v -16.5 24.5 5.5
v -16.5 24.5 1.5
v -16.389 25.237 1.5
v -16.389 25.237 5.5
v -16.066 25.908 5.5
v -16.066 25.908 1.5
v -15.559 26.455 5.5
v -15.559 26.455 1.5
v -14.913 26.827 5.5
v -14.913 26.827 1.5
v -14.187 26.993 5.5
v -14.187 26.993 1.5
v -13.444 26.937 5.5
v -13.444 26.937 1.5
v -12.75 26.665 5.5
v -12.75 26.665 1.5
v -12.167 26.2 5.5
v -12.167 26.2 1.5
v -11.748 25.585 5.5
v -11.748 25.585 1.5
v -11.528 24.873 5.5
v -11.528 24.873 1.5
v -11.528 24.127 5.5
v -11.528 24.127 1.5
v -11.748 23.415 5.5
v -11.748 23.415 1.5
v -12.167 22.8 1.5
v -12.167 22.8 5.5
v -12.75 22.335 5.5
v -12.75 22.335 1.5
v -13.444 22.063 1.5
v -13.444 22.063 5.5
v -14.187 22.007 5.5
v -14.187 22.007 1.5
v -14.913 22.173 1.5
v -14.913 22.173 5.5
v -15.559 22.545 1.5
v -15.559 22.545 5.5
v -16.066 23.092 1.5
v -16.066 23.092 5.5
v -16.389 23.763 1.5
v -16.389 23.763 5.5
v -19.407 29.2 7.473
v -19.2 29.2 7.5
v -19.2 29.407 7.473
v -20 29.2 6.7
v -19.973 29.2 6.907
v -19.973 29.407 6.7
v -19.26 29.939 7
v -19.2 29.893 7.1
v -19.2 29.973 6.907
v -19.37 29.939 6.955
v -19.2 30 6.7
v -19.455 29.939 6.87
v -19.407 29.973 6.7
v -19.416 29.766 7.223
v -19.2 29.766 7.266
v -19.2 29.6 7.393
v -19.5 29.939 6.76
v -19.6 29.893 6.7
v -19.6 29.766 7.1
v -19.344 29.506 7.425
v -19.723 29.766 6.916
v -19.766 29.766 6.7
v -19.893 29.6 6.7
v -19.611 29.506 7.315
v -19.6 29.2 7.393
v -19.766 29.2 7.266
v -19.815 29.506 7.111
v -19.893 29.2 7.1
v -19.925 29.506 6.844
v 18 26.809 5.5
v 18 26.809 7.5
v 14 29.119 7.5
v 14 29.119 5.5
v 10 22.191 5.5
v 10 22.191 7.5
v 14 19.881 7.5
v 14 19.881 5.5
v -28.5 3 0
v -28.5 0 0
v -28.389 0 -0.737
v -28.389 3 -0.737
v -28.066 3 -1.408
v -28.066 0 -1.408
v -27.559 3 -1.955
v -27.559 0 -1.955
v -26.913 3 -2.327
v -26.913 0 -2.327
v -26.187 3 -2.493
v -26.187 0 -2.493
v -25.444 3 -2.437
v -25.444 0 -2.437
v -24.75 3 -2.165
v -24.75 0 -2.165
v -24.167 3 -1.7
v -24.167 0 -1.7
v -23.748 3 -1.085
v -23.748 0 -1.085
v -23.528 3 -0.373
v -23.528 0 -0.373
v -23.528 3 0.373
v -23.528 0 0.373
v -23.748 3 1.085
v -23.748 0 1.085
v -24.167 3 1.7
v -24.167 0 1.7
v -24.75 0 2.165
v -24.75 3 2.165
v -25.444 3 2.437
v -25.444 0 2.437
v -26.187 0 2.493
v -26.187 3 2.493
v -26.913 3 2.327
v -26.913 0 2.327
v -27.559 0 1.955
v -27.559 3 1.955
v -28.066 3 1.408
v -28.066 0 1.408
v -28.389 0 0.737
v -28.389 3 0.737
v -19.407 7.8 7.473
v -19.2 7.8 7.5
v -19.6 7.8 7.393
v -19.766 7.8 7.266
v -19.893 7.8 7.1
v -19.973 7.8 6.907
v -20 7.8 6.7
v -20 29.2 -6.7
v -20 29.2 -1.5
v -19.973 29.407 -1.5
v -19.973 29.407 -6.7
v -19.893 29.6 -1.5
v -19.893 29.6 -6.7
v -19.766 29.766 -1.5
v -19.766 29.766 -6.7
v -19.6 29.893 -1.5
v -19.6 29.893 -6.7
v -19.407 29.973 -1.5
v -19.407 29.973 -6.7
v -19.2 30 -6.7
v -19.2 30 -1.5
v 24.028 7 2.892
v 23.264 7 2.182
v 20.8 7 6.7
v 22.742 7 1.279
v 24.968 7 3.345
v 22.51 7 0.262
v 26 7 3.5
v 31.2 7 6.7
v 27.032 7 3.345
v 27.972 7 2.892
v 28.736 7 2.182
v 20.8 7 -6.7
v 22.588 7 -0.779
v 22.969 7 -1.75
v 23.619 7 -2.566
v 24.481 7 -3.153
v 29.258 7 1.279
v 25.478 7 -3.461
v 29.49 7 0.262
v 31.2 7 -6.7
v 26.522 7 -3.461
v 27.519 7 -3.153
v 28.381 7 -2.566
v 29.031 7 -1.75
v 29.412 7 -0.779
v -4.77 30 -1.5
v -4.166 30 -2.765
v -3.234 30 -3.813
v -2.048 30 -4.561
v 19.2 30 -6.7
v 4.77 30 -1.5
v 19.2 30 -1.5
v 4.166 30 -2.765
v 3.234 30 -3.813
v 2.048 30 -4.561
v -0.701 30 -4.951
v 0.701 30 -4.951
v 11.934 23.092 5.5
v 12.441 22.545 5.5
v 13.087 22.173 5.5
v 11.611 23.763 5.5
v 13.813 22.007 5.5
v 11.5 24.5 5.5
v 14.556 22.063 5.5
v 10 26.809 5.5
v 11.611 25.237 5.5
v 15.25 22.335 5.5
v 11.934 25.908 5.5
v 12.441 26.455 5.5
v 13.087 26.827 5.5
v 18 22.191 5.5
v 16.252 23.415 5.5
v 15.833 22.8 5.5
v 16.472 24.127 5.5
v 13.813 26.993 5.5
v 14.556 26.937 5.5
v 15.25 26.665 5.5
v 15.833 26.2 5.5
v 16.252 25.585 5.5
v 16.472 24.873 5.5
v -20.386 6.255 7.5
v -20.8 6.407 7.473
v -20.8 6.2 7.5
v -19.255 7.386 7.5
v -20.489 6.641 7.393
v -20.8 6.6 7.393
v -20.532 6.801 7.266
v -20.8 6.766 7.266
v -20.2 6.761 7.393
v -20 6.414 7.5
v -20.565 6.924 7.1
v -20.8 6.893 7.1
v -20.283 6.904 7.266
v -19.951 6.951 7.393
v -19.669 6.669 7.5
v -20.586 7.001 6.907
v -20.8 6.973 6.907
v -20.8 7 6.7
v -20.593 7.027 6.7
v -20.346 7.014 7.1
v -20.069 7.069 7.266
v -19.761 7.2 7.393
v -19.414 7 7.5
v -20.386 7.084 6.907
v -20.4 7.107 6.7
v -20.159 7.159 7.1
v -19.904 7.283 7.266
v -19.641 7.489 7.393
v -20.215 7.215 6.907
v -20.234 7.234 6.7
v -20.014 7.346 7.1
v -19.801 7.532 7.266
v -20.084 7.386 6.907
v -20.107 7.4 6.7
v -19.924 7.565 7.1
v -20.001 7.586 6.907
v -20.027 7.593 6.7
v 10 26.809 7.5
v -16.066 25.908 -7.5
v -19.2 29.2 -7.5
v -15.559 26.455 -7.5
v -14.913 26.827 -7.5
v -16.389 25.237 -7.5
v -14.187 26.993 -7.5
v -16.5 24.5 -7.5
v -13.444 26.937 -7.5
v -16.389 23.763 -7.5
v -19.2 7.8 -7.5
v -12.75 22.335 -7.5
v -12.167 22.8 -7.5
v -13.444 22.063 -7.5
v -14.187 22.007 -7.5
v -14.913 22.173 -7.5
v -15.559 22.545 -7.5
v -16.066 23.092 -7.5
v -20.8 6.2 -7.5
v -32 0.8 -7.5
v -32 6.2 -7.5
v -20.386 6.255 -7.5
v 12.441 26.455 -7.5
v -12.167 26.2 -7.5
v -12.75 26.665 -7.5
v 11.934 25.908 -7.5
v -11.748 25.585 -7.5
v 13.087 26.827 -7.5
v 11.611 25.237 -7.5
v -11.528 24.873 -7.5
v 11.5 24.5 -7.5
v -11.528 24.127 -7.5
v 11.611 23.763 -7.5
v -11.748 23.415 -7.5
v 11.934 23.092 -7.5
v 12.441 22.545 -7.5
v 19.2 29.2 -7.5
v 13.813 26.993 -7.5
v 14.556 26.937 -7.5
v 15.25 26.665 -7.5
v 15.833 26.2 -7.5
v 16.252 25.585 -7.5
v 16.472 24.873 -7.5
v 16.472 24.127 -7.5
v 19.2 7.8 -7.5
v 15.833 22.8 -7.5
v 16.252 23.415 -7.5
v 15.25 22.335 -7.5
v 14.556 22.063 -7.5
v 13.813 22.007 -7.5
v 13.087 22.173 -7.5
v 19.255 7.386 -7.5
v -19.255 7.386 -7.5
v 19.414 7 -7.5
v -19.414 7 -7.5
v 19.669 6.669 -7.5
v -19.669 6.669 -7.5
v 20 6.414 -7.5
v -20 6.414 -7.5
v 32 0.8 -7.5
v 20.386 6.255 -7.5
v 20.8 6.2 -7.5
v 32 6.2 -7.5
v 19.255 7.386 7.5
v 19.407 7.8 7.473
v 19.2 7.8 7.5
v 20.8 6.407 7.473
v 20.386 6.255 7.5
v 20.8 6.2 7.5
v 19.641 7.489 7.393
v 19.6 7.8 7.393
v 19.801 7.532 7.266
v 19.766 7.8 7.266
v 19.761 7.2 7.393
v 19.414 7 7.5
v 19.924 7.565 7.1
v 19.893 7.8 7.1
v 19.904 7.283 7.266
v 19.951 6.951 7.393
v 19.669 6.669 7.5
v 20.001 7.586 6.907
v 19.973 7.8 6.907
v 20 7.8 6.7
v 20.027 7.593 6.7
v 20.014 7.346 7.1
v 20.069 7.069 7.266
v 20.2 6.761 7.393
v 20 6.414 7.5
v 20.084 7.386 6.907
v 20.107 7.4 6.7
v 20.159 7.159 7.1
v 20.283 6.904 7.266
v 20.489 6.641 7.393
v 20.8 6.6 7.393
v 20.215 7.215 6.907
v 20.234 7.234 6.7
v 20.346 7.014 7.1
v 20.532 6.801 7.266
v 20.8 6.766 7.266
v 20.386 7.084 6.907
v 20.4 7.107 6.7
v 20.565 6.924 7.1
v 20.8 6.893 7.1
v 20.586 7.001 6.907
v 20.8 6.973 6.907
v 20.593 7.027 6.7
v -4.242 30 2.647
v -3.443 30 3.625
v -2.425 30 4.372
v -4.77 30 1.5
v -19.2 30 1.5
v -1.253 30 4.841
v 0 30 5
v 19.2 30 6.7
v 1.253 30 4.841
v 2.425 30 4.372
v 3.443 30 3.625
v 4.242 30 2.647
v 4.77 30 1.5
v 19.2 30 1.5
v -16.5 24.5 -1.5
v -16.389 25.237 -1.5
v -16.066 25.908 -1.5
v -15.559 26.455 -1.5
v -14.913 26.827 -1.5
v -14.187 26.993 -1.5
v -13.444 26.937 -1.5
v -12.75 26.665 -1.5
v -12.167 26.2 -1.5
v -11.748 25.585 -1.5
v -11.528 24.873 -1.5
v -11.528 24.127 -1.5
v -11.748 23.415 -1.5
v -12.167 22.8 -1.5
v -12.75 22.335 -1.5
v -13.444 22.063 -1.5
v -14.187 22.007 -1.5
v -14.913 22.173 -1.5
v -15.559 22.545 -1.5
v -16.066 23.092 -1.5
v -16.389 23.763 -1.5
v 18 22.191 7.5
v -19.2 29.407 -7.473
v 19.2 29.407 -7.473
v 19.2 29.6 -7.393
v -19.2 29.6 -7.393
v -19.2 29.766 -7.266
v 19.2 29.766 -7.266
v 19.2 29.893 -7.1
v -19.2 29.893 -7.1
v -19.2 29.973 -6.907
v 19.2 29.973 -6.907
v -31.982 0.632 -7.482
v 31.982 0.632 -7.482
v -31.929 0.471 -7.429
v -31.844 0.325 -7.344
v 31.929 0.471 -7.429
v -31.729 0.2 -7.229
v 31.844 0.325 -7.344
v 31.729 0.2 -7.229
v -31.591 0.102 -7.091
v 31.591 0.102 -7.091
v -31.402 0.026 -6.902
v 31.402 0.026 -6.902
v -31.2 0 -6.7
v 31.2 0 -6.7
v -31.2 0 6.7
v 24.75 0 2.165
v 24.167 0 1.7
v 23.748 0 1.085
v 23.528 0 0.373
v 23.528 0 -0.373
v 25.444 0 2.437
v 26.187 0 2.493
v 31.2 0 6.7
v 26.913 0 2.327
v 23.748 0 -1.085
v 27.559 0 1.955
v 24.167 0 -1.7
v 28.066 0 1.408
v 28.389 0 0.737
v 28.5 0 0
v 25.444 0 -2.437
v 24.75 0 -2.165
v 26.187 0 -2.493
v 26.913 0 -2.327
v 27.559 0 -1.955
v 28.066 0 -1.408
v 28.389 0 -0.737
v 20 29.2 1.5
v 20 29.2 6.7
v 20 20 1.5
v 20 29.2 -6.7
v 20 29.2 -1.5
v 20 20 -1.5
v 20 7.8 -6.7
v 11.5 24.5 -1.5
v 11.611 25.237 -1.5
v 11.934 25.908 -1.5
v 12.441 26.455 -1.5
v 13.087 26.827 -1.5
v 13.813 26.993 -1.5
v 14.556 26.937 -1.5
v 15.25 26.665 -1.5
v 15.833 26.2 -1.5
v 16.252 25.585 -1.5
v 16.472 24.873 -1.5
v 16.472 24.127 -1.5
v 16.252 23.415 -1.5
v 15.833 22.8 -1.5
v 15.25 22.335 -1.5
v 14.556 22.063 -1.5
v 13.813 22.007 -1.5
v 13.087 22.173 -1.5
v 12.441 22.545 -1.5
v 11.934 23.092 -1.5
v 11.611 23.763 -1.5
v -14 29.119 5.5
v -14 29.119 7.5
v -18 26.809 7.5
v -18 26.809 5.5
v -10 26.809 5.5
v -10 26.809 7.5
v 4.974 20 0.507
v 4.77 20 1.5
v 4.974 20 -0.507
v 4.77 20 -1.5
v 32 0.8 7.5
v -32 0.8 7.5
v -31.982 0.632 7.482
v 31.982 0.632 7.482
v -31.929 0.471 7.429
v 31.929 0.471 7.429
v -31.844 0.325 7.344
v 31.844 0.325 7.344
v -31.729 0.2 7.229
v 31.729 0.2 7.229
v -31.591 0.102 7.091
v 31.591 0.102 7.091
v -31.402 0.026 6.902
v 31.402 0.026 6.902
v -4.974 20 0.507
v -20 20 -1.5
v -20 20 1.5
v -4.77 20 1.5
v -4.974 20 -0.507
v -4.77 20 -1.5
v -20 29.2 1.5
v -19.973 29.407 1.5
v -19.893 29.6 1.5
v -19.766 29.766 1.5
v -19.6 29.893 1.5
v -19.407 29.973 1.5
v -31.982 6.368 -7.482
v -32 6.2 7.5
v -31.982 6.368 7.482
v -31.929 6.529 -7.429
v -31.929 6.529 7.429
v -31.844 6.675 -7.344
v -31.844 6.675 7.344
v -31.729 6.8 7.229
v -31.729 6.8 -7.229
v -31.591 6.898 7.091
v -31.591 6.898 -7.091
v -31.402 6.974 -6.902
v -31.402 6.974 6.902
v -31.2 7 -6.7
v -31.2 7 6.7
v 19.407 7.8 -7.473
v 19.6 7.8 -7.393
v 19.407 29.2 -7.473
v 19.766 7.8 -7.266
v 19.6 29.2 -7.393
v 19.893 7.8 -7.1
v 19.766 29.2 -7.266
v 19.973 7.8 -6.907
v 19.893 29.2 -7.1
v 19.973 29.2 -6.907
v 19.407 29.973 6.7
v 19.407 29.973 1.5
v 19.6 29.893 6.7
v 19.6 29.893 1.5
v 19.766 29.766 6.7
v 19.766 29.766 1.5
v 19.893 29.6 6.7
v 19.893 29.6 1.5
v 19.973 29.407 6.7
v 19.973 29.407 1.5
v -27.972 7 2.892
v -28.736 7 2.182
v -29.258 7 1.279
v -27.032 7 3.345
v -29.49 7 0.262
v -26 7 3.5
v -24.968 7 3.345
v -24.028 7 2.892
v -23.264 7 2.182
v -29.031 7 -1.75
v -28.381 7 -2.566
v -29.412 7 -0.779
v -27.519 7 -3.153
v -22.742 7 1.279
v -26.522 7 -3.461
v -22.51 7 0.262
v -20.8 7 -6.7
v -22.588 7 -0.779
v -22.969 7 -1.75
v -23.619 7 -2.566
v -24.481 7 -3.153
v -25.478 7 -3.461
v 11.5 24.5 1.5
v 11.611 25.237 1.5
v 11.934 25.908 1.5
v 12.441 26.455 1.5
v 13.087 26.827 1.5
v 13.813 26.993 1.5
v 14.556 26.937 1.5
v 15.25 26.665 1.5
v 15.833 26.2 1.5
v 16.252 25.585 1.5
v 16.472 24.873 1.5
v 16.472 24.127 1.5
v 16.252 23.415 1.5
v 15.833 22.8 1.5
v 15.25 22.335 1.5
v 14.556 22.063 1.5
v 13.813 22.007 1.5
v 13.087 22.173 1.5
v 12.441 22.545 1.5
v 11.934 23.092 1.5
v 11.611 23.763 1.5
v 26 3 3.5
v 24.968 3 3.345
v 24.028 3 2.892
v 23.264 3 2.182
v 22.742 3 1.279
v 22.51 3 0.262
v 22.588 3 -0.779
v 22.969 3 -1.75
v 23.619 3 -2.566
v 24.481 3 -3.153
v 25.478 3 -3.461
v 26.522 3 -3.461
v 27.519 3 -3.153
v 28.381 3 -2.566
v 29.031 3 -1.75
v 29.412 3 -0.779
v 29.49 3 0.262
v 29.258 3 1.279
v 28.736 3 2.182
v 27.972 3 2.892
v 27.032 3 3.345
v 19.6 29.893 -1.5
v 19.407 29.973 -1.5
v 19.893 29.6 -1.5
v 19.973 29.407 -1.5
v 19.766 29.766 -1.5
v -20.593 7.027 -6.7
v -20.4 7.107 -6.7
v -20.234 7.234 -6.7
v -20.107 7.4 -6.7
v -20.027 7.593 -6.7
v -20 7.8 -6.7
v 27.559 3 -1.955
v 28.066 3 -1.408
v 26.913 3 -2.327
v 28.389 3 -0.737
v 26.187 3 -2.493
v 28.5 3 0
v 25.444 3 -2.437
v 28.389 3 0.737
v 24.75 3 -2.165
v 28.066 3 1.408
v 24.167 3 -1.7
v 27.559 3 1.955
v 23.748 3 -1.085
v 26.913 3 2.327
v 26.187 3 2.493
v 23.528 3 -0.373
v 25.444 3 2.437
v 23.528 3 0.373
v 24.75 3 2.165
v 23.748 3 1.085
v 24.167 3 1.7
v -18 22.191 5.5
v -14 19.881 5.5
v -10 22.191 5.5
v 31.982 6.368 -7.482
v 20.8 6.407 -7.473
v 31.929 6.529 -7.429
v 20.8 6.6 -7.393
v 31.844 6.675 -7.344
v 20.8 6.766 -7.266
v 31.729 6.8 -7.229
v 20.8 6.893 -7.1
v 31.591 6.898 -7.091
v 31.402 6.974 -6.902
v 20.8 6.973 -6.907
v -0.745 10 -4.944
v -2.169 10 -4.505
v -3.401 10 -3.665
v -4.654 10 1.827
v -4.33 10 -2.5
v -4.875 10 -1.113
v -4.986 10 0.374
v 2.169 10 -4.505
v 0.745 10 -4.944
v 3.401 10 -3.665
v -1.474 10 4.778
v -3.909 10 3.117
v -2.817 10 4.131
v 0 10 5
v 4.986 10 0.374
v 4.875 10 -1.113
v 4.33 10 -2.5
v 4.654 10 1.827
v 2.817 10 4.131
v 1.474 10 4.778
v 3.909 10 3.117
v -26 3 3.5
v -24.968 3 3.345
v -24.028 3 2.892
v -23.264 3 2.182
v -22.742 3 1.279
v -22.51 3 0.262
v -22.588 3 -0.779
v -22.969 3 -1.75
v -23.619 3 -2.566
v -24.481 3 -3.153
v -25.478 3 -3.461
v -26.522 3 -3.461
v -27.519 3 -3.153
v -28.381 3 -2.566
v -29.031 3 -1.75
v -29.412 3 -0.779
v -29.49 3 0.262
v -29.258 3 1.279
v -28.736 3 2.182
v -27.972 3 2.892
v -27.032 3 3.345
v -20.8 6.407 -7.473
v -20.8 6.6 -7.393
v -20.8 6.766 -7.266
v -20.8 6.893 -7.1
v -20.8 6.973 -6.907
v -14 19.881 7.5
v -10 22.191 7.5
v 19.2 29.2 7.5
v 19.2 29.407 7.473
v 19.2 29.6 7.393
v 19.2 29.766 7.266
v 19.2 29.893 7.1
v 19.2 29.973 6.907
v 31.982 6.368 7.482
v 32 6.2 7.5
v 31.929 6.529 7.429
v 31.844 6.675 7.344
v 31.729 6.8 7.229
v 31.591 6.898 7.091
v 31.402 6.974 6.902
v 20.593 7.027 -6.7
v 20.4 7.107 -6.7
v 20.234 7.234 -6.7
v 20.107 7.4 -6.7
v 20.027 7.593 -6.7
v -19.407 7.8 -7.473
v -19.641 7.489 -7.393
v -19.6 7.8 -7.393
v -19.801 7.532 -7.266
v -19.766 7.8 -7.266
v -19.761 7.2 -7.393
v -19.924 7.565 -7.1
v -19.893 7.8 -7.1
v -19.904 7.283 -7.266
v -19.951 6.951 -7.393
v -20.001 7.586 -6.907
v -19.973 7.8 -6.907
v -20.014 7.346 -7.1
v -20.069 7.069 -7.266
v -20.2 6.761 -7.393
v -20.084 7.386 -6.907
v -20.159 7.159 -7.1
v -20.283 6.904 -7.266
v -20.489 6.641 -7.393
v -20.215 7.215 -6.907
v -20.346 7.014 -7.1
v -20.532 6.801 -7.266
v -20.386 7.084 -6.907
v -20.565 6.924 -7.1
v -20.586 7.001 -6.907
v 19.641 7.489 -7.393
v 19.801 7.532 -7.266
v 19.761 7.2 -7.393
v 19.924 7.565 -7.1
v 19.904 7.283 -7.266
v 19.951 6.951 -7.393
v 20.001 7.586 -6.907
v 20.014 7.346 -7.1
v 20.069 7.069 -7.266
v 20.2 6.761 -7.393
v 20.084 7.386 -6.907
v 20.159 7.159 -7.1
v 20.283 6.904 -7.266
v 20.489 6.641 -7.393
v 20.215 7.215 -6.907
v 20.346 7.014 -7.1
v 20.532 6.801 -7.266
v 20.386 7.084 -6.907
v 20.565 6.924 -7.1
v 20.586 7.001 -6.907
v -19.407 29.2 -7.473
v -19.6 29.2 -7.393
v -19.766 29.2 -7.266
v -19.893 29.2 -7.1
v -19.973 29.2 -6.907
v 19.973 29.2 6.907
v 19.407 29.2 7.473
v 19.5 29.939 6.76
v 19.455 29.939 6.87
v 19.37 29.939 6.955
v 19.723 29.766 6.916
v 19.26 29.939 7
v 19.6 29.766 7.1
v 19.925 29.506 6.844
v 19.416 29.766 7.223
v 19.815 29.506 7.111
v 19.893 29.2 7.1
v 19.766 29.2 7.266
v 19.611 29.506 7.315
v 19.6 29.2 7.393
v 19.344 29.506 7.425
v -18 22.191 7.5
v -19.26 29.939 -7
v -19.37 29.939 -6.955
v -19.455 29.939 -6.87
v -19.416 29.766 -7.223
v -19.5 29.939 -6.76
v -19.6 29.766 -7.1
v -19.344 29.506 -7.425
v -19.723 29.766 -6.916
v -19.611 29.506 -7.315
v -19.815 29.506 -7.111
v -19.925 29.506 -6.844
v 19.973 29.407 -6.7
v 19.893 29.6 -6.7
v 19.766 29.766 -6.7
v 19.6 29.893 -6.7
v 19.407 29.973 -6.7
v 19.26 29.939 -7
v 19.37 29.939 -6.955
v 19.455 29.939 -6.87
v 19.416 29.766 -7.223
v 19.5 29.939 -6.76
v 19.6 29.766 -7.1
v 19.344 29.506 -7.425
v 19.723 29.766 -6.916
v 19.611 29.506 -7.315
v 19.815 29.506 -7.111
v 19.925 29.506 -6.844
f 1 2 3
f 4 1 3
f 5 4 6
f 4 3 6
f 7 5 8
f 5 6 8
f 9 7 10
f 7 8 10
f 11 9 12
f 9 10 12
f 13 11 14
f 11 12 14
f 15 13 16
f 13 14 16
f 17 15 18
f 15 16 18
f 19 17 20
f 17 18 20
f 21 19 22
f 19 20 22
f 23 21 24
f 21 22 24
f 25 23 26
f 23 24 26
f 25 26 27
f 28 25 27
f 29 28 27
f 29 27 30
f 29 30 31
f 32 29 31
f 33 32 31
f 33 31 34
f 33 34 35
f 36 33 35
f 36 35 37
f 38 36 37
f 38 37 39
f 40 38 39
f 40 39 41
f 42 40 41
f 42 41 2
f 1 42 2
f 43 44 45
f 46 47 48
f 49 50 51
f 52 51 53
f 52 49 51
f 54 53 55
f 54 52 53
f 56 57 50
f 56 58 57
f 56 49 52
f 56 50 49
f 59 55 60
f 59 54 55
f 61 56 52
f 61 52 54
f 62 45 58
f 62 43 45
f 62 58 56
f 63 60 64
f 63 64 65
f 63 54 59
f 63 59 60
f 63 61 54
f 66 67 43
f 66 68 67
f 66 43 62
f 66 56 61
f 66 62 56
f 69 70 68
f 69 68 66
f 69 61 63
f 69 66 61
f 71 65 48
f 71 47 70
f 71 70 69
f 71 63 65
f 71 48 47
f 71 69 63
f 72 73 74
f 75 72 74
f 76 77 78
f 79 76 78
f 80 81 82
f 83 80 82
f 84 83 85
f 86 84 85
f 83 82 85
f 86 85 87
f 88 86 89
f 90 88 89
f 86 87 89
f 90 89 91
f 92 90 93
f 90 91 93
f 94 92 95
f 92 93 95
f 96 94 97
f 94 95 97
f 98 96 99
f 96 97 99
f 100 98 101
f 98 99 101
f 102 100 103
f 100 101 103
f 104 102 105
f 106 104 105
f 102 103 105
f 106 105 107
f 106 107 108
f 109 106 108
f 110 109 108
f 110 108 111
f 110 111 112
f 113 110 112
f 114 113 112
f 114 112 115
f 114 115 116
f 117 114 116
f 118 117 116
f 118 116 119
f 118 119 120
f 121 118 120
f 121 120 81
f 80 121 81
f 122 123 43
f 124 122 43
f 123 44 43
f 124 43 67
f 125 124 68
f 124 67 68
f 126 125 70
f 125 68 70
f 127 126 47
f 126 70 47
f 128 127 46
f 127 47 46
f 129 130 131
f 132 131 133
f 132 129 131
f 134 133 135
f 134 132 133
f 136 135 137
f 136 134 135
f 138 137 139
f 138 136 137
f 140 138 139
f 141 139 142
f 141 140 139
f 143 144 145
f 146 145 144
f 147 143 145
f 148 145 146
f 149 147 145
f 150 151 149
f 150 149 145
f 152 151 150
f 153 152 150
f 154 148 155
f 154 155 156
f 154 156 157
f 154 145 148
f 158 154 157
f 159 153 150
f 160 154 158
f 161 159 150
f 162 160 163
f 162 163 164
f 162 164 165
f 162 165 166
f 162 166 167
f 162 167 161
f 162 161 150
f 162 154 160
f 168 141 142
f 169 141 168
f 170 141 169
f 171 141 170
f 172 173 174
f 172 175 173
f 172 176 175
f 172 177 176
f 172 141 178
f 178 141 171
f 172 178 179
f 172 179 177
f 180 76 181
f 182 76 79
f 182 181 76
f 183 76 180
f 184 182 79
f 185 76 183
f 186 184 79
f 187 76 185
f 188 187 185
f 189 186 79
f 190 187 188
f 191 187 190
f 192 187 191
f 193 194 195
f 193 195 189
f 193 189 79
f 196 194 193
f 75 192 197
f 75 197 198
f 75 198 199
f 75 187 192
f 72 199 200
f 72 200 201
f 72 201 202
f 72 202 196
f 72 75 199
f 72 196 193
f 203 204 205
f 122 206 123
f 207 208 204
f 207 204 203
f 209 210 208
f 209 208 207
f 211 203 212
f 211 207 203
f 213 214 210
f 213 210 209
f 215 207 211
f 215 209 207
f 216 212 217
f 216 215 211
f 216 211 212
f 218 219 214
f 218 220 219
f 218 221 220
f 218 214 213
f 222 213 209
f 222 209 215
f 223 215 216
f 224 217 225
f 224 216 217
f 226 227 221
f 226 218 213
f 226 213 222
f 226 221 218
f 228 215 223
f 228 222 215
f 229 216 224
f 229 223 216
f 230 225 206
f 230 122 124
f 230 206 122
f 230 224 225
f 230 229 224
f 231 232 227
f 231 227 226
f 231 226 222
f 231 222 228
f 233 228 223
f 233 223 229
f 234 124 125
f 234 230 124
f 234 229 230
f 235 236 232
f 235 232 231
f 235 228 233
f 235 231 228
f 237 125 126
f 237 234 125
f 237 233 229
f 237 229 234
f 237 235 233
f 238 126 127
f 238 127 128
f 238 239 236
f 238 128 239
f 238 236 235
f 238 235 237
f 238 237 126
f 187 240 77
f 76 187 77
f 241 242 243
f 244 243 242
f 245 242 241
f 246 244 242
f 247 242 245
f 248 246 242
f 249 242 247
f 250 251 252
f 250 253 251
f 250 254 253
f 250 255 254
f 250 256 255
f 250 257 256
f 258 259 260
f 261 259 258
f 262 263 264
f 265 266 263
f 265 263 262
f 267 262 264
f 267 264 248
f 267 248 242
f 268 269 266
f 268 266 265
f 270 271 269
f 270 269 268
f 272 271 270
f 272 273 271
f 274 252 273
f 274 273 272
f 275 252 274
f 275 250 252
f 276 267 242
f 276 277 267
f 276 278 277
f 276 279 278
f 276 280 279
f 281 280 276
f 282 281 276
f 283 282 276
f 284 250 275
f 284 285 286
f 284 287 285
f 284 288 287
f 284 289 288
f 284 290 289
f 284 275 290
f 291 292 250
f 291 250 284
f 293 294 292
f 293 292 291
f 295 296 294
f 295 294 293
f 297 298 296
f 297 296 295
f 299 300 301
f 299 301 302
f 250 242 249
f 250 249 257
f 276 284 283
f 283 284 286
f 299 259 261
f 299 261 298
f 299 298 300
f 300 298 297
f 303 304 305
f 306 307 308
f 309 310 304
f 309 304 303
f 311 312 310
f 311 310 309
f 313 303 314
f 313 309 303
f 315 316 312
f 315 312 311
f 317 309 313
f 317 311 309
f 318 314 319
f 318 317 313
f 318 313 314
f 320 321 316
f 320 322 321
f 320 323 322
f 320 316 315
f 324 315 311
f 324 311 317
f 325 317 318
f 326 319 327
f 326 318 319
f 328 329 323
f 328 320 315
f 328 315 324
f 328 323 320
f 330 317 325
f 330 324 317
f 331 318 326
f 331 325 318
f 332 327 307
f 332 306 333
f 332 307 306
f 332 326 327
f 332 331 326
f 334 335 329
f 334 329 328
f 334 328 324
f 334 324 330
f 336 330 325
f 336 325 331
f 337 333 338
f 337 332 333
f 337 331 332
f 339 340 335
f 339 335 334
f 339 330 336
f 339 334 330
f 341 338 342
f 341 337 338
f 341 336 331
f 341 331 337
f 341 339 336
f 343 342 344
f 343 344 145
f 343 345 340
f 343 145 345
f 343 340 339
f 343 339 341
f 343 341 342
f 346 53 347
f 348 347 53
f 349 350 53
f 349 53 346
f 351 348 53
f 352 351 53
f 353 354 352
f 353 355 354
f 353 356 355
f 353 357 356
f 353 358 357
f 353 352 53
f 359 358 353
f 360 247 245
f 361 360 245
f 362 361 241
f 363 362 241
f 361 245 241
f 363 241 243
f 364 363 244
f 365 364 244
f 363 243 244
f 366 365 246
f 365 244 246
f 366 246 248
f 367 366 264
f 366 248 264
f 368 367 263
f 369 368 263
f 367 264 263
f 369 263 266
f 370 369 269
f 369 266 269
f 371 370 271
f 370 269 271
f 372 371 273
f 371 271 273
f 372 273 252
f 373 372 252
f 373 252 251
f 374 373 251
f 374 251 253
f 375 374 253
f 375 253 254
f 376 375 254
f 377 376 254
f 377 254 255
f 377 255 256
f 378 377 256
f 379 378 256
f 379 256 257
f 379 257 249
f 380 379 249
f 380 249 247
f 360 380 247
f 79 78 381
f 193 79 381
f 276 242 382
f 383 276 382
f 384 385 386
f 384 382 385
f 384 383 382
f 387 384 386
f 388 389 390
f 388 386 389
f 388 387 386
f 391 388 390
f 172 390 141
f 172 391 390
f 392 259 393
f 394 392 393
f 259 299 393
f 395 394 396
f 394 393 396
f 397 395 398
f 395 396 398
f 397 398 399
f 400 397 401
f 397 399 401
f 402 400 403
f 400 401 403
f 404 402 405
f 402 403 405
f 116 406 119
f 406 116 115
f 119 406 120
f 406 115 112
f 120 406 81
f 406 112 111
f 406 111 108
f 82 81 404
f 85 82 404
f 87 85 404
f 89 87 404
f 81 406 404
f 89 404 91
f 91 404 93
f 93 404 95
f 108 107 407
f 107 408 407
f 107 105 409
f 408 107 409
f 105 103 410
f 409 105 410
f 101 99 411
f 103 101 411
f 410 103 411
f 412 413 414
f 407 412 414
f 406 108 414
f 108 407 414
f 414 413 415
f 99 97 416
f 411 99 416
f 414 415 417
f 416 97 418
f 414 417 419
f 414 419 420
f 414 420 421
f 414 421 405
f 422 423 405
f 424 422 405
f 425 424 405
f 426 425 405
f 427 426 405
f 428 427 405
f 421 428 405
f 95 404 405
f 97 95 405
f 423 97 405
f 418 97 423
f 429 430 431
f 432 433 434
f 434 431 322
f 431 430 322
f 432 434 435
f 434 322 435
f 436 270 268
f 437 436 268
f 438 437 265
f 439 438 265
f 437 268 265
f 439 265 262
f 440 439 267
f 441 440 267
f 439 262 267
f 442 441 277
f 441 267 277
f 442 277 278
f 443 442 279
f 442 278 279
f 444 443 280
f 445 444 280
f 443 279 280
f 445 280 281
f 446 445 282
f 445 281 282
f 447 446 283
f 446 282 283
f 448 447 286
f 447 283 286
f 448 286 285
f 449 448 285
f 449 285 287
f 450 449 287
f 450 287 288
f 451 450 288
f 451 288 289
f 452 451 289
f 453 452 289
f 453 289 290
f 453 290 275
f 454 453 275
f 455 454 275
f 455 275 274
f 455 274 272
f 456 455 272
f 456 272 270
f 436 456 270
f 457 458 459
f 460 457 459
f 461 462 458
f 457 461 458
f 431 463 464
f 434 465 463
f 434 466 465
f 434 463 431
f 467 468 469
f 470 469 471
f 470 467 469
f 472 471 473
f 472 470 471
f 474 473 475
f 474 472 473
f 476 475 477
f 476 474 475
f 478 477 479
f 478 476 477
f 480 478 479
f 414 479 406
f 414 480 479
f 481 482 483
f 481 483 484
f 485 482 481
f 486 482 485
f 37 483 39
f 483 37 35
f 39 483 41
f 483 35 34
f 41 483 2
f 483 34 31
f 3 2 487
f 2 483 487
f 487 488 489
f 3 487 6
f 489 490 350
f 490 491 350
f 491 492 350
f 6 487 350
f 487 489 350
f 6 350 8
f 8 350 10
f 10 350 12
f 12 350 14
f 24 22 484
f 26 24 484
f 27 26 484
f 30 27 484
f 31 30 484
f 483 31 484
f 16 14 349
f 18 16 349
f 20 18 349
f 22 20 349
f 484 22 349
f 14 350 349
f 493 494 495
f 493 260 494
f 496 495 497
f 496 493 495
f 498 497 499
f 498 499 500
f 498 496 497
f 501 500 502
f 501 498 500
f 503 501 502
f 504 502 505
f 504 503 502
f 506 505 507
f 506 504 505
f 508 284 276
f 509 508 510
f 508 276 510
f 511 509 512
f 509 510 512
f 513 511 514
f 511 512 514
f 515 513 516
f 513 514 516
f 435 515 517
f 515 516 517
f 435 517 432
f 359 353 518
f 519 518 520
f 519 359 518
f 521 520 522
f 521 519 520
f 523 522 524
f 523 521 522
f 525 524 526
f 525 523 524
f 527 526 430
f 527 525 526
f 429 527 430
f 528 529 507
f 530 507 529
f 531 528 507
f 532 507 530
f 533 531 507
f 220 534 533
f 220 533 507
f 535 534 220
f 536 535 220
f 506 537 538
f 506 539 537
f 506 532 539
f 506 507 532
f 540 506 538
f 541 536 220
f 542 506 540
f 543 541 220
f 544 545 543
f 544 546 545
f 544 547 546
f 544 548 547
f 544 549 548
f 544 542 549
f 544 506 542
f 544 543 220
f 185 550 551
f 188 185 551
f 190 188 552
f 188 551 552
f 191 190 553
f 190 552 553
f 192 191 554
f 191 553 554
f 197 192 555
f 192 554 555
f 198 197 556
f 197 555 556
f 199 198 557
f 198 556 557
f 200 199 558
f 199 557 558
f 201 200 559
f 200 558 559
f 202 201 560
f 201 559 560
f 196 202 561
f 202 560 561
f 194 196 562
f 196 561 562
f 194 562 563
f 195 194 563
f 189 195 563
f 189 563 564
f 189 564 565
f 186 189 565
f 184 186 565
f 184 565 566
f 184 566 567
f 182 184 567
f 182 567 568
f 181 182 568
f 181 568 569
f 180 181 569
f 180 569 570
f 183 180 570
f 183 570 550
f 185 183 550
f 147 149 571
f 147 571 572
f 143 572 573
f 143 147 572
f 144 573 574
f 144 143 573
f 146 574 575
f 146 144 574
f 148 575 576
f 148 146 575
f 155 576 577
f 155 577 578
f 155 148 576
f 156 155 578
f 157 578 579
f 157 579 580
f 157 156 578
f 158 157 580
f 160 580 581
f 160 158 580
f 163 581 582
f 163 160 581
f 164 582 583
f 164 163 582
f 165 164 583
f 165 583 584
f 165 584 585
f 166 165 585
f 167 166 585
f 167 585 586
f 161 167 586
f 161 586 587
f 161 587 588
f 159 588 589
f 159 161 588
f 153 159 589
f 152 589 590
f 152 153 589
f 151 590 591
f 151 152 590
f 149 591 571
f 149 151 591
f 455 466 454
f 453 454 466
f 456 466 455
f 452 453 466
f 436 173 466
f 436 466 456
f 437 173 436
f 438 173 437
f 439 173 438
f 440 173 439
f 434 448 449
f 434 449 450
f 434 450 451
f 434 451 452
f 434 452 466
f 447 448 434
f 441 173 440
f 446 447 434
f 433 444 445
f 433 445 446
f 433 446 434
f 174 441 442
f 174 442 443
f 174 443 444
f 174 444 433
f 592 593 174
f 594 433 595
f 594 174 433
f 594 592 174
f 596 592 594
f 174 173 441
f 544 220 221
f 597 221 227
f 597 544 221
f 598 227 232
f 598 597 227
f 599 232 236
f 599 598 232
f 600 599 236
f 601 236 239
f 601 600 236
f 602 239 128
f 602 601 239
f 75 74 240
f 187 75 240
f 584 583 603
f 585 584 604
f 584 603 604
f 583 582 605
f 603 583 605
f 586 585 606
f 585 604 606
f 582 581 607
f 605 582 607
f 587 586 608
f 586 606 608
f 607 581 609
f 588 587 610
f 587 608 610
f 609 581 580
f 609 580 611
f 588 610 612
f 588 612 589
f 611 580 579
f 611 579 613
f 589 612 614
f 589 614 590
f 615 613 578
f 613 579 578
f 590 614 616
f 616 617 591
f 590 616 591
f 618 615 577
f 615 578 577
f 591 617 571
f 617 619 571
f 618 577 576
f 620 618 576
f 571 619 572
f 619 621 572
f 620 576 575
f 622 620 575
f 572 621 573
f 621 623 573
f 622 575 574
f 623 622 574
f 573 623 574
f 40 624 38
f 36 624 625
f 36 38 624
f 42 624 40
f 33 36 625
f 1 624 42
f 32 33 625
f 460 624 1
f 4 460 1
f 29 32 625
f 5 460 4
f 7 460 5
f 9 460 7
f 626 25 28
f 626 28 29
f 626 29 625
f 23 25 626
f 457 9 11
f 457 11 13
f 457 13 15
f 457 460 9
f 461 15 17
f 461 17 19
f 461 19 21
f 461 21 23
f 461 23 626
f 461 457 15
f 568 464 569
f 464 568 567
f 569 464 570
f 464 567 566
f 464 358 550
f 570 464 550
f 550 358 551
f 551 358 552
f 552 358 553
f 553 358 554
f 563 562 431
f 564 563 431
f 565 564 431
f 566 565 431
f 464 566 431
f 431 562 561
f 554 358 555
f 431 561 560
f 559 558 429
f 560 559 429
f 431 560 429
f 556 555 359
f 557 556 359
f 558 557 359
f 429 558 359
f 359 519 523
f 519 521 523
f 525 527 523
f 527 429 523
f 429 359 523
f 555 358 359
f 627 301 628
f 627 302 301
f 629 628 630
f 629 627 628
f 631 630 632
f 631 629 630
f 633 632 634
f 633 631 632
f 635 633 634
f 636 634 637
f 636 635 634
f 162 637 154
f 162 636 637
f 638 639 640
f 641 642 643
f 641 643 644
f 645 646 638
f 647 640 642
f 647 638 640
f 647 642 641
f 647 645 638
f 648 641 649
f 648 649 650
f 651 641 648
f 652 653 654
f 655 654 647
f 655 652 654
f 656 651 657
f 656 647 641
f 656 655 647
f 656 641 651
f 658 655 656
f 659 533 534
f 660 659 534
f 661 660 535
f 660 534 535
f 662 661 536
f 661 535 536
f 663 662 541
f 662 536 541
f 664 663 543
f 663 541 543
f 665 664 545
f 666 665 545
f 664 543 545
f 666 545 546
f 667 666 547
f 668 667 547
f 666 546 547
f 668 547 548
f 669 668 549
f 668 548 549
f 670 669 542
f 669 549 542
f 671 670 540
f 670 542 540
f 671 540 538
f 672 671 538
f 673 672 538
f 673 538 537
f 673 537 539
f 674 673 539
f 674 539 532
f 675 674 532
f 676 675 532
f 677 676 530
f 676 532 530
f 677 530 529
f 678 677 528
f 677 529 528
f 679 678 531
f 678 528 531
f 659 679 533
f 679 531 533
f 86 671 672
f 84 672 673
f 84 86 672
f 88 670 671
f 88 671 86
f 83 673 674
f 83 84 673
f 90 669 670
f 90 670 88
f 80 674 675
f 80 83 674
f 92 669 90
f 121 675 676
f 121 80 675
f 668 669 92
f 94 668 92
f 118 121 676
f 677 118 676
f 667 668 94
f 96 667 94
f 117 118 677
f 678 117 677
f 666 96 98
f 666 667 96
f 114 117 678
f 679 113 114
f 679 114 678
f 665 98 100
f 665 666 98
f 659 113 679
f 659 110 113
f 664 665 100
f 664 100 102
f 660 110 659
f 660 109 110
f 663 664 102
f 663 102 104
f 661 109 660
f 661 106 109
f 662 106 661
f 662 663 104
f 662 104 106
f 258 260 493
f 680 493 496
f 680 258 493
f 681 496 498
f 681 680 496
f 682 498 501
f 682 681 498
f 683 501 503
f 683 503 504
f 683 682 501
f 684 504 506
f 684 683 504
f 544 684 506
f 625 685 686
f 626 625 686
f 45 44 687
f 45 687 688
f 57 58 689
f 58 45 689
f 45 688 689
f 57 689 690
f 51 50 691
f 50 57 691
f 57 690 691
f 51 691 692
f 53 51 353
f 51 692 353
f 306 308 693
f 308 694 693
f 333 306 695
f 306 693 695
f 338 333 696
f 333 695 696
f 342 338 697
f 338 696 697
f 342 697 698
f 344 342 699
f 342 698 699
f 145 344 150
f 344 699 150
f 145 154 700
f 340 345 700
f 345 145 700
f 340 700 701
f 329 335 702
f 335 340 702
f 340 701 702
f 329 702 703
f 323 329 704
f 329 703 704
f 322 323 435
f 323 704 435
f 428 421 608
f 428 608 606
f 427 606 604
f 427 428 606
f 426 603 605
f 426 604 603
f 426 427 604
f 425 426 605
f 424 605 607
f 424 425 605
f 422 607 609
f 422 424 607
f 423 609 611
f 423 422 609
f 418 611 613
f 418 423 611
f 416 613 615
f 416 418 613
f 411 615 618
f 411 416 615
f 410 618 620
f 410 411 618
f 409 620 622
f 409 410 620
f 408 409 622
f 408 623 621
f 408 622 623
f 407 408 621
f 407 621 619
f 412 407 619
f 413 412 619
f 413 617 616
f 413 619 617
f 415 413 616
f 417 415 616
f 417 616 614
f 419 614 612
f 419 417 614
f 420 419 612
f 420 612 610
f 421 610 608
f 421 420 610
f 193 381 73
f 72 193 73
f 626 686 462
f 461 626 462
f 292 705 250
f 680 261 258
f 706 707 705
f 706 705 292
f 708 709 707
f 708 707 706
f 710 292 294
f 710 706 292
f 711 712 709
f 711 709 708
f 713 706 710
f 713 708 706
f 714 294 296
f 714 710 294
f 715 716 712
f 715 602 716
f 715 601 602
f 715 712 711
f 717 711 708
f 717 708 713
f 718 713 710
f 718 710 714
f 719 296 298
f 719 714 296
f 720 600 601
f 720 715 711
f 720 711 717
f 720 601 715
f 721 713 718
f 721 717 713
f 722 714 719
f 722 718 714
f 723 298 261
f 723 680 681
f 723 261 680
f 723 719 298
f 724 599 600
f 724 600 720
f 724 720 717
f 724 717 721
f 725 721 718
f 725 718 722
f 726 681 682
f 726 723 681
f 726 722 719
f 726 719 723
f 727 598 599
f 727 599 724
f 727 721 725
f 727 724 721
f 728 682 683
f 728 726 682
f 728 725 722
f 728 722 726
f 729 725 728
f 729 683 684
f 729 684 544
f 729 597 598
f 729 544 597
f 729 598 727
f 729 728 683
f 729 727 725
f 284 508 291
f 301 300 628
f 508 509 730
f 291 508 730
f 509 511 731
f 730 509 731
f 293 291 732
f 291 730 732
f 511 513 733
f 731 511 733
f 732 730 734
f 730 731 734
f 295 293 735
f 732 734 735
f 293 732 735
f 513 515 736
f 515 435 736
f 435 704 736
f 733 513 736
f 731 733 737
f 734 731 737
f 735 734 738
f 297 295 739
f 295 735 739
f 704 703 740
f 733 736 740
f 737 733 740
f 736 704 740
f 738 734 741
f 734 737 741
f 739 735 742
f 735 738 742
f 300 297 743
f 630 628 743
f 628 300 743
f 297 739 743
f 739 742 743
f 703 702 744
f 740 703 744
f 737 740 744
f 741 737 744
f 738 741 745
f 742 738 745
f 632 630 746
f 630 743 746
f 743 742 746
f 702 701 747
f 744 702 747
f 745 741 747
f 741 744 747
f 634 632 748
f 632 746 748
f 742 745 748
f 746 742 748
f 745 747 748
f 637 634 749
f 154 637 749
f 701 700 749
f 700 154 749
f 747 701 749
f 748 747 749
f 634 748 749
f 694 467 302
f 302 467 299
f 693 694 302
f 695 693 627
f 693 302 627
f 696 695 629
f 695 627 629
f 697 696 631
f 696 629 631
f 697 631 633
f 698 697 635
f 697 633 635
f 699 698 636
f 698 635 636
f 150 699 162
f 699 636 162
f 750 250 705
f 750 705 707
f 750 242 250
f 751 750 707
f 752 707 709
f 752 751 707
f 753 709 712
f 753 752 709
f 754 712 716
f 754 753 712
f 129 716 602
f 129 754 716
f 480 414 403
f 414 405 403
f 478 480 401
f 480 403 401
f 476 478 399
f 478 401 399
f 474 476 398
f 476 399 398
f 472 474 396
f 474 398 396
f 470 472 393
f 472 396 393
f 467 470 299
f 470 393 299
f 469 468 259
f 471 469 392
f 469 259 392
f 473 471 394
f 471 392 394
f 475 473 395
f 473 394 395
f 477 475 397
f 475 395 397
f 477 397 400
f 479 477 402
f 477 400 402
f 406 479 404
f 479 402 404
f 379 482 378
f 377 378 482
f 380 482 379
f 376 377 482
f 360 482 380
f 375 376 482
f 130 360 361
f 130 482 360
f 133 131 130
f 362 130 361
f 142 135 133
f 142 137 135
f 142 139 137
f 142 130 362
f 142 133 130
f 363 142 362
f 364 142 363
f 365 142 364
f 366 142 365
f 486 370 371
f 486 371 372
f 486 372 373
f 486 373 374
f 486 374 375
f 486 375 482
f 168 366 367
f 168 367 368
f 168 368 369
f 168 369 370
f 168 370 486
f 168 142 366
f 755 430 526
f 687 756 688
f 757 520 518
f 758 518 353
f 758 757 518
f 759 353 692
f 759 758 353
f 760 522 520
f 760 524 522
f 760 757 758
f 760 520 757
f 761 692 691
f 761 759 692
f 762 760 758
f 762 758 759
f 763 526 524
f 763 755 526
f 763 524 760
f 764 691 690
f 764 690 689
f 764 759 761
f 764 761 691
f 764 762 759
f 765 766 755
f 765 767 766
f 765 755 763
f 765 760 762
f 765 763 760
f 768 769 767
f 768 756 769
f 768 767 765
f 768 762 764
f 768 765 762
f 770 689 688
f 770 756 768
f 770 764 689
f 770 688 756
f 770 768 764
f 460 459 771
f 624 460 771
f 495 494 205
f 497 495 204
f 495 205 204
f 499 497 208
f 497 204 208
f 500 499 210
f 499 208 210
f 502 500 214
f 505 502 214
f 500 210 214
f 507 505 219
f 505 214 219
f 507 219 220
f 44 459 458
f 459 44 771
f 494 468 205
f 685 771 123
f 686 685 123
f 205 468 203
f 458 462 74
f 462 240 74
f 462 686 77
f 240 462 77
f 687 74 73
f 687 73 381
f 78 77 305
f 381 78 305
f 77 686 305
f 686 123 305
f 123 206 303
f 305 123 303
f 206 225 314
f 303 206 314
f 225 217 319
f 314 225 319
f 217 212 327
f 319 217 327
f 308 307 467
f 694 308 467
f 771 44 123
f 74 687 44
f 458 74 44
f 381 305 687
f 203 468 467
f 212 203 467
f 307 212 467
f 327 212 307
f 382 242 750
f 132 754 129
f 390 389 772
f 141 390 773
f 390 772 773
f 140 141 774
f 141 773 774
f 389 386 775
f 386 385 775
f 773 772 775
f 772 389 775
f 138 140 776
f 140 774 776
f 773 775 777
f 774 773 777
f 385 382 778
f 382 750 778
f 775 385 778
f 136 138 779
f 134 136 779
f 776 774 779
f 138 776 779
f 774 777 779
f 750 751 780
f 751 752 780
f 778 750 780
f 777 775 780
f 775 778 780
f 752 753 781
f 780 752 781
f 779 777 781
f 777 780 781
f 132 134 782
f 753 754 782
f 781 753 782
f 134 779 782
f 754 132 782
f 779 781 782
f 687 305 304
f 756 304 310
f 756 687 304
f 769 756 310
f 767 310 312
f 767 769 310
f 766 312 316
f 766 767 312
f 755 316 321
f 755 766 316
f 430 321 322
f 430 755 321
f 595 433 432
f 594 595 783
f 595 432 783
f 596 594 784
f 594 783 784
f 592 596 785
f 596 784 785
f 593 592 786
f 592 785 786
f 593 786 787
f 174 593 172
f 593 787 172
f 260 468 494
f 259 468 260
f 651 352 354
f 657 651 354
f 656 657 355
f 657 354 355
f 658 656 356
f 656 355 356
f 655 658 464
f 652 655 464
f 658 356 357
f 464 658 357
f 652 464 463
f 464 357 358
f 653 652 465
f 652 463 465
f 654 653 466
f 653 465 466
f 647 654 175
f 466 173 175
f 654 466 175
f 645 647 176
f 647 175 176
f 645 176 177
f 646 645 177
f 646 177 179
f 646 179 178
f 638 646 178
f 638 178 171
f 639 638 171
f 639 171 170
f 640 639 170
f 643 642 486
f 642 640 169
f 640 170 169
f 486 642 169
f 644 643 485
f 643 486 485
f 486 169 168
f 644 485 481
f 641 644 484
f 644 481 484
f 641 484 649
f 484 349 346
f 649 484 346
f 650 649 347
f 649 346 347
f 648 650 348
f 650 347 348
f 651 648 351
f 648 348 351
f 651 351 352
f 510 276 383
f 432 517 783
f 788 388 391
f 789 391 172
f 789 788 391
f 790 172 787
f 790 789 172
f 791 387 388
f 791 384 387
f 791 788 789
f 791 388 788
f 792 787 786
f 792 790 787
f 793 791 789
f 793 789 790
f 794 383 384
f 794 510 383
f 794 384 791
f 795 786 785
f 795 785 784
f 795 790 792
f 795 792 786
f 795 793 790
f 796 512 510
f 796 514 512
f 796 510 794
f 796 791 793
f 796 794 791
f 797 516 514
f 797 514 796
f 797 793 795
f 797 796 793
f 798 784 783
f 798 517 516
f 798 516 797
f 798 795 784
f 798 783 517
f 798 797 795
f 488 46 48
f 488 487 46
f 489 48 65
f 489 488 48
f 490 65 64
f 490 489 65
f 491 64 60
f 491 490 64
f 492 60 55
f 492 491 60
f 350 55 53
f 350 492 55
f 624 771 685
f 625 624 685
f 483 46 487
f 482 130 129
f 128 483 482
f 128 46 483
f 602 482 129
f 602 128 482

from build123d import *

# Parameters (mm, degrees)
SKETCH_1_W          = 64
SKETCH_1_H          = 15
EXTRUDE_1_DEPTH     = 7
SKETCH_2_W          = 40
SKETCH_2_H          = 15
EXTRUDE_2_DEPTH     = 23
SKETCH_3_R          = 5
CUT_EXTRUDE_1_DEPTH = 20
SKETCH_4_W          = 40
SKETCH_4_H          = 3
CUT_EXTRUDE_2_DEPTH = 10
HOLE_WIZARD_M5_1_D  = 5
SKETCH_8_R          = 3.5
CUT_EXTRUDE_3_DEPTH = 4
HOLE_WIZARD_M5_2_D  = 5
CUT_EXTRUDE_5_DEPTH = 2
FILLET_1_R          = 0.8


with BuildPart() as part:
    # 草图1 → 凸台-拉伸1 (new body)
    with BuildSketch(Plane(origin=(0, 0, 0), x_dir=(1, 0, 0), z_dir=(0, 1, 0))):
        Rectangle(SKETCH_1_W, SKETCH_1_H)
    extrude(amount=EXTRUDE_1_DEPTH)

    # 草图2 → 凸台-拉伸2 (add)
    with BuildSketch(Plane(origin=(0, 7, 0), x_dir=(1, 0, 0), z_dir=(0, 1, 0))):
        Rectangle(SKETCH_2_W, SKETCH_2_H)
    extrude(amount=EXTRUDE_2_DEPTH)

    # 草图3 → 切除-拉伸1 (cut)
    with BuildSketch(Plane(origin=(0, 30, 0), x_dir=(1, 0, 0), z_dir=(0, 1, 0))):
        with Locations(Location((0, 0, 0), (0, 0, 270))):
            Circle(SKETCH_3_R)
    extrude(amount=-CUT_EXTRUDE_1_DEPTH, mode=Mode.SUBTRACT)

    # 草图4 → 切除-拉伸2 (cut)
    with BuildSketch(Plane(origin=(0, 30, 0), x_dir=(1, 0, 0), z_dir=(0, 1, 0))):
        Rectangle(SKETCH_4_W, SKETCH_4_H)
    extrude(amount=-CUT_EXTRUDE_2_DEPTH, mode=Mode.SUBTRACT)

    # M5 螺纹孔的螺纹孔钻头1 (through all)
    with Locations(Plane.XY.offset(7.5)):
        with Locations((-14, 24.5), (14, 24.5)):
            Hole(HOLE_WIZARD_M5_1_D / 2)

    # 草图8 → 切除-拉伸3 (cut)
    with BuildSketch(Plane(origin=(0, 7, 0), x_dir=(1, 0, 0), z_dir=(0, 1, 0))):
        with Locations(Location((-26, 0, 0), (0, 0, 270))):
            Circle(SKETCH_8_R)
    cut_extrude_3 = extrude(amount=-CUT_EXTRUDE_3_DEPTH, mode=Mode.SUBTRACT)

    # M5 螺纹孔的螺纹孔钻头2 (through all)
    with Locations(Plane(origin=(0, 3, 0), x_dir=(1, 0, 0), z_dir=(0, 1, 0))):
        with Locations((-26, 0)):
            hole_wizard_m5_2 = Hole(HOLE_WIZARD_M5_2_D / 2)

    # 镜向1: 切除-拉伸3, M5 螺纹孔的螺纹孔钻头2 across plane
    add(cut_extrude_3.mirror(Plane(origin=(0, 0, 0), x_dir=(0, 0, 1), z_dir=(1, 0, 0))), mode=Mode.SUBTRACT)
    add(hole_wizard_m5_2.mirror(Plane(origin=(0, 0, 0), x_dir=(0, 0, 1), z_dir=(1, 0, 0))), mode=Mode.SUBTRACT)

    # 草图12 → 切除-拉伸5 (cut)
    with BuildSketch(Plane.XY.offset(7.5)):
        Polygon((-14, 19.881197846), (-10, 22.190598923), (-10, 26.809401077), (-14, 29.118802154), (-18, 26.809401077), (-18, 22.190598923), align=None)
        Polygon((14, 19.881197846), (18, 22.190598923), (18, 26.809401077), (14, 29.118802154), (10, 26.809401077), (10, 22.190598923), align=None)
    extrude(amount=-CUT_EXTRUDE_5_DEPTH, mode=Mode.SUBTRACT)

    # 圆角1
    fillet_1_edges = [part.edges().sort_by_distance(p)[0] for p in [
        (-32, 7, 0),
        (-26, 7, -7.5),
        (26, 7, 7.5),
        (20, 7, 0),
        (20, 18.5, 7.5),
        (20, 18.5, -7.5),
        (-20, 7, 0),
        (-20, 18.5, -7.5),
        (-26, 7, 7.5),
        (-20, 18.5, 7.5),
        (20, 30, 4.5),
        (0, 30, -7.5),
        (-20, 30, -4.5),
        (0, 30, 7.5),
        (20, 30, -4.5),
        (-20, 30, 4.5),
        (32, 7, 0),
        (0, 0, 7.5),
        (-32, 0, 0),
        (0, 0, -7.5),
        (32, 0, 0),
        (26, 7, -7.5),
    ]]
    fillet(fillet_1_edges, radius=FILLET_1_R)


solid = part.part
